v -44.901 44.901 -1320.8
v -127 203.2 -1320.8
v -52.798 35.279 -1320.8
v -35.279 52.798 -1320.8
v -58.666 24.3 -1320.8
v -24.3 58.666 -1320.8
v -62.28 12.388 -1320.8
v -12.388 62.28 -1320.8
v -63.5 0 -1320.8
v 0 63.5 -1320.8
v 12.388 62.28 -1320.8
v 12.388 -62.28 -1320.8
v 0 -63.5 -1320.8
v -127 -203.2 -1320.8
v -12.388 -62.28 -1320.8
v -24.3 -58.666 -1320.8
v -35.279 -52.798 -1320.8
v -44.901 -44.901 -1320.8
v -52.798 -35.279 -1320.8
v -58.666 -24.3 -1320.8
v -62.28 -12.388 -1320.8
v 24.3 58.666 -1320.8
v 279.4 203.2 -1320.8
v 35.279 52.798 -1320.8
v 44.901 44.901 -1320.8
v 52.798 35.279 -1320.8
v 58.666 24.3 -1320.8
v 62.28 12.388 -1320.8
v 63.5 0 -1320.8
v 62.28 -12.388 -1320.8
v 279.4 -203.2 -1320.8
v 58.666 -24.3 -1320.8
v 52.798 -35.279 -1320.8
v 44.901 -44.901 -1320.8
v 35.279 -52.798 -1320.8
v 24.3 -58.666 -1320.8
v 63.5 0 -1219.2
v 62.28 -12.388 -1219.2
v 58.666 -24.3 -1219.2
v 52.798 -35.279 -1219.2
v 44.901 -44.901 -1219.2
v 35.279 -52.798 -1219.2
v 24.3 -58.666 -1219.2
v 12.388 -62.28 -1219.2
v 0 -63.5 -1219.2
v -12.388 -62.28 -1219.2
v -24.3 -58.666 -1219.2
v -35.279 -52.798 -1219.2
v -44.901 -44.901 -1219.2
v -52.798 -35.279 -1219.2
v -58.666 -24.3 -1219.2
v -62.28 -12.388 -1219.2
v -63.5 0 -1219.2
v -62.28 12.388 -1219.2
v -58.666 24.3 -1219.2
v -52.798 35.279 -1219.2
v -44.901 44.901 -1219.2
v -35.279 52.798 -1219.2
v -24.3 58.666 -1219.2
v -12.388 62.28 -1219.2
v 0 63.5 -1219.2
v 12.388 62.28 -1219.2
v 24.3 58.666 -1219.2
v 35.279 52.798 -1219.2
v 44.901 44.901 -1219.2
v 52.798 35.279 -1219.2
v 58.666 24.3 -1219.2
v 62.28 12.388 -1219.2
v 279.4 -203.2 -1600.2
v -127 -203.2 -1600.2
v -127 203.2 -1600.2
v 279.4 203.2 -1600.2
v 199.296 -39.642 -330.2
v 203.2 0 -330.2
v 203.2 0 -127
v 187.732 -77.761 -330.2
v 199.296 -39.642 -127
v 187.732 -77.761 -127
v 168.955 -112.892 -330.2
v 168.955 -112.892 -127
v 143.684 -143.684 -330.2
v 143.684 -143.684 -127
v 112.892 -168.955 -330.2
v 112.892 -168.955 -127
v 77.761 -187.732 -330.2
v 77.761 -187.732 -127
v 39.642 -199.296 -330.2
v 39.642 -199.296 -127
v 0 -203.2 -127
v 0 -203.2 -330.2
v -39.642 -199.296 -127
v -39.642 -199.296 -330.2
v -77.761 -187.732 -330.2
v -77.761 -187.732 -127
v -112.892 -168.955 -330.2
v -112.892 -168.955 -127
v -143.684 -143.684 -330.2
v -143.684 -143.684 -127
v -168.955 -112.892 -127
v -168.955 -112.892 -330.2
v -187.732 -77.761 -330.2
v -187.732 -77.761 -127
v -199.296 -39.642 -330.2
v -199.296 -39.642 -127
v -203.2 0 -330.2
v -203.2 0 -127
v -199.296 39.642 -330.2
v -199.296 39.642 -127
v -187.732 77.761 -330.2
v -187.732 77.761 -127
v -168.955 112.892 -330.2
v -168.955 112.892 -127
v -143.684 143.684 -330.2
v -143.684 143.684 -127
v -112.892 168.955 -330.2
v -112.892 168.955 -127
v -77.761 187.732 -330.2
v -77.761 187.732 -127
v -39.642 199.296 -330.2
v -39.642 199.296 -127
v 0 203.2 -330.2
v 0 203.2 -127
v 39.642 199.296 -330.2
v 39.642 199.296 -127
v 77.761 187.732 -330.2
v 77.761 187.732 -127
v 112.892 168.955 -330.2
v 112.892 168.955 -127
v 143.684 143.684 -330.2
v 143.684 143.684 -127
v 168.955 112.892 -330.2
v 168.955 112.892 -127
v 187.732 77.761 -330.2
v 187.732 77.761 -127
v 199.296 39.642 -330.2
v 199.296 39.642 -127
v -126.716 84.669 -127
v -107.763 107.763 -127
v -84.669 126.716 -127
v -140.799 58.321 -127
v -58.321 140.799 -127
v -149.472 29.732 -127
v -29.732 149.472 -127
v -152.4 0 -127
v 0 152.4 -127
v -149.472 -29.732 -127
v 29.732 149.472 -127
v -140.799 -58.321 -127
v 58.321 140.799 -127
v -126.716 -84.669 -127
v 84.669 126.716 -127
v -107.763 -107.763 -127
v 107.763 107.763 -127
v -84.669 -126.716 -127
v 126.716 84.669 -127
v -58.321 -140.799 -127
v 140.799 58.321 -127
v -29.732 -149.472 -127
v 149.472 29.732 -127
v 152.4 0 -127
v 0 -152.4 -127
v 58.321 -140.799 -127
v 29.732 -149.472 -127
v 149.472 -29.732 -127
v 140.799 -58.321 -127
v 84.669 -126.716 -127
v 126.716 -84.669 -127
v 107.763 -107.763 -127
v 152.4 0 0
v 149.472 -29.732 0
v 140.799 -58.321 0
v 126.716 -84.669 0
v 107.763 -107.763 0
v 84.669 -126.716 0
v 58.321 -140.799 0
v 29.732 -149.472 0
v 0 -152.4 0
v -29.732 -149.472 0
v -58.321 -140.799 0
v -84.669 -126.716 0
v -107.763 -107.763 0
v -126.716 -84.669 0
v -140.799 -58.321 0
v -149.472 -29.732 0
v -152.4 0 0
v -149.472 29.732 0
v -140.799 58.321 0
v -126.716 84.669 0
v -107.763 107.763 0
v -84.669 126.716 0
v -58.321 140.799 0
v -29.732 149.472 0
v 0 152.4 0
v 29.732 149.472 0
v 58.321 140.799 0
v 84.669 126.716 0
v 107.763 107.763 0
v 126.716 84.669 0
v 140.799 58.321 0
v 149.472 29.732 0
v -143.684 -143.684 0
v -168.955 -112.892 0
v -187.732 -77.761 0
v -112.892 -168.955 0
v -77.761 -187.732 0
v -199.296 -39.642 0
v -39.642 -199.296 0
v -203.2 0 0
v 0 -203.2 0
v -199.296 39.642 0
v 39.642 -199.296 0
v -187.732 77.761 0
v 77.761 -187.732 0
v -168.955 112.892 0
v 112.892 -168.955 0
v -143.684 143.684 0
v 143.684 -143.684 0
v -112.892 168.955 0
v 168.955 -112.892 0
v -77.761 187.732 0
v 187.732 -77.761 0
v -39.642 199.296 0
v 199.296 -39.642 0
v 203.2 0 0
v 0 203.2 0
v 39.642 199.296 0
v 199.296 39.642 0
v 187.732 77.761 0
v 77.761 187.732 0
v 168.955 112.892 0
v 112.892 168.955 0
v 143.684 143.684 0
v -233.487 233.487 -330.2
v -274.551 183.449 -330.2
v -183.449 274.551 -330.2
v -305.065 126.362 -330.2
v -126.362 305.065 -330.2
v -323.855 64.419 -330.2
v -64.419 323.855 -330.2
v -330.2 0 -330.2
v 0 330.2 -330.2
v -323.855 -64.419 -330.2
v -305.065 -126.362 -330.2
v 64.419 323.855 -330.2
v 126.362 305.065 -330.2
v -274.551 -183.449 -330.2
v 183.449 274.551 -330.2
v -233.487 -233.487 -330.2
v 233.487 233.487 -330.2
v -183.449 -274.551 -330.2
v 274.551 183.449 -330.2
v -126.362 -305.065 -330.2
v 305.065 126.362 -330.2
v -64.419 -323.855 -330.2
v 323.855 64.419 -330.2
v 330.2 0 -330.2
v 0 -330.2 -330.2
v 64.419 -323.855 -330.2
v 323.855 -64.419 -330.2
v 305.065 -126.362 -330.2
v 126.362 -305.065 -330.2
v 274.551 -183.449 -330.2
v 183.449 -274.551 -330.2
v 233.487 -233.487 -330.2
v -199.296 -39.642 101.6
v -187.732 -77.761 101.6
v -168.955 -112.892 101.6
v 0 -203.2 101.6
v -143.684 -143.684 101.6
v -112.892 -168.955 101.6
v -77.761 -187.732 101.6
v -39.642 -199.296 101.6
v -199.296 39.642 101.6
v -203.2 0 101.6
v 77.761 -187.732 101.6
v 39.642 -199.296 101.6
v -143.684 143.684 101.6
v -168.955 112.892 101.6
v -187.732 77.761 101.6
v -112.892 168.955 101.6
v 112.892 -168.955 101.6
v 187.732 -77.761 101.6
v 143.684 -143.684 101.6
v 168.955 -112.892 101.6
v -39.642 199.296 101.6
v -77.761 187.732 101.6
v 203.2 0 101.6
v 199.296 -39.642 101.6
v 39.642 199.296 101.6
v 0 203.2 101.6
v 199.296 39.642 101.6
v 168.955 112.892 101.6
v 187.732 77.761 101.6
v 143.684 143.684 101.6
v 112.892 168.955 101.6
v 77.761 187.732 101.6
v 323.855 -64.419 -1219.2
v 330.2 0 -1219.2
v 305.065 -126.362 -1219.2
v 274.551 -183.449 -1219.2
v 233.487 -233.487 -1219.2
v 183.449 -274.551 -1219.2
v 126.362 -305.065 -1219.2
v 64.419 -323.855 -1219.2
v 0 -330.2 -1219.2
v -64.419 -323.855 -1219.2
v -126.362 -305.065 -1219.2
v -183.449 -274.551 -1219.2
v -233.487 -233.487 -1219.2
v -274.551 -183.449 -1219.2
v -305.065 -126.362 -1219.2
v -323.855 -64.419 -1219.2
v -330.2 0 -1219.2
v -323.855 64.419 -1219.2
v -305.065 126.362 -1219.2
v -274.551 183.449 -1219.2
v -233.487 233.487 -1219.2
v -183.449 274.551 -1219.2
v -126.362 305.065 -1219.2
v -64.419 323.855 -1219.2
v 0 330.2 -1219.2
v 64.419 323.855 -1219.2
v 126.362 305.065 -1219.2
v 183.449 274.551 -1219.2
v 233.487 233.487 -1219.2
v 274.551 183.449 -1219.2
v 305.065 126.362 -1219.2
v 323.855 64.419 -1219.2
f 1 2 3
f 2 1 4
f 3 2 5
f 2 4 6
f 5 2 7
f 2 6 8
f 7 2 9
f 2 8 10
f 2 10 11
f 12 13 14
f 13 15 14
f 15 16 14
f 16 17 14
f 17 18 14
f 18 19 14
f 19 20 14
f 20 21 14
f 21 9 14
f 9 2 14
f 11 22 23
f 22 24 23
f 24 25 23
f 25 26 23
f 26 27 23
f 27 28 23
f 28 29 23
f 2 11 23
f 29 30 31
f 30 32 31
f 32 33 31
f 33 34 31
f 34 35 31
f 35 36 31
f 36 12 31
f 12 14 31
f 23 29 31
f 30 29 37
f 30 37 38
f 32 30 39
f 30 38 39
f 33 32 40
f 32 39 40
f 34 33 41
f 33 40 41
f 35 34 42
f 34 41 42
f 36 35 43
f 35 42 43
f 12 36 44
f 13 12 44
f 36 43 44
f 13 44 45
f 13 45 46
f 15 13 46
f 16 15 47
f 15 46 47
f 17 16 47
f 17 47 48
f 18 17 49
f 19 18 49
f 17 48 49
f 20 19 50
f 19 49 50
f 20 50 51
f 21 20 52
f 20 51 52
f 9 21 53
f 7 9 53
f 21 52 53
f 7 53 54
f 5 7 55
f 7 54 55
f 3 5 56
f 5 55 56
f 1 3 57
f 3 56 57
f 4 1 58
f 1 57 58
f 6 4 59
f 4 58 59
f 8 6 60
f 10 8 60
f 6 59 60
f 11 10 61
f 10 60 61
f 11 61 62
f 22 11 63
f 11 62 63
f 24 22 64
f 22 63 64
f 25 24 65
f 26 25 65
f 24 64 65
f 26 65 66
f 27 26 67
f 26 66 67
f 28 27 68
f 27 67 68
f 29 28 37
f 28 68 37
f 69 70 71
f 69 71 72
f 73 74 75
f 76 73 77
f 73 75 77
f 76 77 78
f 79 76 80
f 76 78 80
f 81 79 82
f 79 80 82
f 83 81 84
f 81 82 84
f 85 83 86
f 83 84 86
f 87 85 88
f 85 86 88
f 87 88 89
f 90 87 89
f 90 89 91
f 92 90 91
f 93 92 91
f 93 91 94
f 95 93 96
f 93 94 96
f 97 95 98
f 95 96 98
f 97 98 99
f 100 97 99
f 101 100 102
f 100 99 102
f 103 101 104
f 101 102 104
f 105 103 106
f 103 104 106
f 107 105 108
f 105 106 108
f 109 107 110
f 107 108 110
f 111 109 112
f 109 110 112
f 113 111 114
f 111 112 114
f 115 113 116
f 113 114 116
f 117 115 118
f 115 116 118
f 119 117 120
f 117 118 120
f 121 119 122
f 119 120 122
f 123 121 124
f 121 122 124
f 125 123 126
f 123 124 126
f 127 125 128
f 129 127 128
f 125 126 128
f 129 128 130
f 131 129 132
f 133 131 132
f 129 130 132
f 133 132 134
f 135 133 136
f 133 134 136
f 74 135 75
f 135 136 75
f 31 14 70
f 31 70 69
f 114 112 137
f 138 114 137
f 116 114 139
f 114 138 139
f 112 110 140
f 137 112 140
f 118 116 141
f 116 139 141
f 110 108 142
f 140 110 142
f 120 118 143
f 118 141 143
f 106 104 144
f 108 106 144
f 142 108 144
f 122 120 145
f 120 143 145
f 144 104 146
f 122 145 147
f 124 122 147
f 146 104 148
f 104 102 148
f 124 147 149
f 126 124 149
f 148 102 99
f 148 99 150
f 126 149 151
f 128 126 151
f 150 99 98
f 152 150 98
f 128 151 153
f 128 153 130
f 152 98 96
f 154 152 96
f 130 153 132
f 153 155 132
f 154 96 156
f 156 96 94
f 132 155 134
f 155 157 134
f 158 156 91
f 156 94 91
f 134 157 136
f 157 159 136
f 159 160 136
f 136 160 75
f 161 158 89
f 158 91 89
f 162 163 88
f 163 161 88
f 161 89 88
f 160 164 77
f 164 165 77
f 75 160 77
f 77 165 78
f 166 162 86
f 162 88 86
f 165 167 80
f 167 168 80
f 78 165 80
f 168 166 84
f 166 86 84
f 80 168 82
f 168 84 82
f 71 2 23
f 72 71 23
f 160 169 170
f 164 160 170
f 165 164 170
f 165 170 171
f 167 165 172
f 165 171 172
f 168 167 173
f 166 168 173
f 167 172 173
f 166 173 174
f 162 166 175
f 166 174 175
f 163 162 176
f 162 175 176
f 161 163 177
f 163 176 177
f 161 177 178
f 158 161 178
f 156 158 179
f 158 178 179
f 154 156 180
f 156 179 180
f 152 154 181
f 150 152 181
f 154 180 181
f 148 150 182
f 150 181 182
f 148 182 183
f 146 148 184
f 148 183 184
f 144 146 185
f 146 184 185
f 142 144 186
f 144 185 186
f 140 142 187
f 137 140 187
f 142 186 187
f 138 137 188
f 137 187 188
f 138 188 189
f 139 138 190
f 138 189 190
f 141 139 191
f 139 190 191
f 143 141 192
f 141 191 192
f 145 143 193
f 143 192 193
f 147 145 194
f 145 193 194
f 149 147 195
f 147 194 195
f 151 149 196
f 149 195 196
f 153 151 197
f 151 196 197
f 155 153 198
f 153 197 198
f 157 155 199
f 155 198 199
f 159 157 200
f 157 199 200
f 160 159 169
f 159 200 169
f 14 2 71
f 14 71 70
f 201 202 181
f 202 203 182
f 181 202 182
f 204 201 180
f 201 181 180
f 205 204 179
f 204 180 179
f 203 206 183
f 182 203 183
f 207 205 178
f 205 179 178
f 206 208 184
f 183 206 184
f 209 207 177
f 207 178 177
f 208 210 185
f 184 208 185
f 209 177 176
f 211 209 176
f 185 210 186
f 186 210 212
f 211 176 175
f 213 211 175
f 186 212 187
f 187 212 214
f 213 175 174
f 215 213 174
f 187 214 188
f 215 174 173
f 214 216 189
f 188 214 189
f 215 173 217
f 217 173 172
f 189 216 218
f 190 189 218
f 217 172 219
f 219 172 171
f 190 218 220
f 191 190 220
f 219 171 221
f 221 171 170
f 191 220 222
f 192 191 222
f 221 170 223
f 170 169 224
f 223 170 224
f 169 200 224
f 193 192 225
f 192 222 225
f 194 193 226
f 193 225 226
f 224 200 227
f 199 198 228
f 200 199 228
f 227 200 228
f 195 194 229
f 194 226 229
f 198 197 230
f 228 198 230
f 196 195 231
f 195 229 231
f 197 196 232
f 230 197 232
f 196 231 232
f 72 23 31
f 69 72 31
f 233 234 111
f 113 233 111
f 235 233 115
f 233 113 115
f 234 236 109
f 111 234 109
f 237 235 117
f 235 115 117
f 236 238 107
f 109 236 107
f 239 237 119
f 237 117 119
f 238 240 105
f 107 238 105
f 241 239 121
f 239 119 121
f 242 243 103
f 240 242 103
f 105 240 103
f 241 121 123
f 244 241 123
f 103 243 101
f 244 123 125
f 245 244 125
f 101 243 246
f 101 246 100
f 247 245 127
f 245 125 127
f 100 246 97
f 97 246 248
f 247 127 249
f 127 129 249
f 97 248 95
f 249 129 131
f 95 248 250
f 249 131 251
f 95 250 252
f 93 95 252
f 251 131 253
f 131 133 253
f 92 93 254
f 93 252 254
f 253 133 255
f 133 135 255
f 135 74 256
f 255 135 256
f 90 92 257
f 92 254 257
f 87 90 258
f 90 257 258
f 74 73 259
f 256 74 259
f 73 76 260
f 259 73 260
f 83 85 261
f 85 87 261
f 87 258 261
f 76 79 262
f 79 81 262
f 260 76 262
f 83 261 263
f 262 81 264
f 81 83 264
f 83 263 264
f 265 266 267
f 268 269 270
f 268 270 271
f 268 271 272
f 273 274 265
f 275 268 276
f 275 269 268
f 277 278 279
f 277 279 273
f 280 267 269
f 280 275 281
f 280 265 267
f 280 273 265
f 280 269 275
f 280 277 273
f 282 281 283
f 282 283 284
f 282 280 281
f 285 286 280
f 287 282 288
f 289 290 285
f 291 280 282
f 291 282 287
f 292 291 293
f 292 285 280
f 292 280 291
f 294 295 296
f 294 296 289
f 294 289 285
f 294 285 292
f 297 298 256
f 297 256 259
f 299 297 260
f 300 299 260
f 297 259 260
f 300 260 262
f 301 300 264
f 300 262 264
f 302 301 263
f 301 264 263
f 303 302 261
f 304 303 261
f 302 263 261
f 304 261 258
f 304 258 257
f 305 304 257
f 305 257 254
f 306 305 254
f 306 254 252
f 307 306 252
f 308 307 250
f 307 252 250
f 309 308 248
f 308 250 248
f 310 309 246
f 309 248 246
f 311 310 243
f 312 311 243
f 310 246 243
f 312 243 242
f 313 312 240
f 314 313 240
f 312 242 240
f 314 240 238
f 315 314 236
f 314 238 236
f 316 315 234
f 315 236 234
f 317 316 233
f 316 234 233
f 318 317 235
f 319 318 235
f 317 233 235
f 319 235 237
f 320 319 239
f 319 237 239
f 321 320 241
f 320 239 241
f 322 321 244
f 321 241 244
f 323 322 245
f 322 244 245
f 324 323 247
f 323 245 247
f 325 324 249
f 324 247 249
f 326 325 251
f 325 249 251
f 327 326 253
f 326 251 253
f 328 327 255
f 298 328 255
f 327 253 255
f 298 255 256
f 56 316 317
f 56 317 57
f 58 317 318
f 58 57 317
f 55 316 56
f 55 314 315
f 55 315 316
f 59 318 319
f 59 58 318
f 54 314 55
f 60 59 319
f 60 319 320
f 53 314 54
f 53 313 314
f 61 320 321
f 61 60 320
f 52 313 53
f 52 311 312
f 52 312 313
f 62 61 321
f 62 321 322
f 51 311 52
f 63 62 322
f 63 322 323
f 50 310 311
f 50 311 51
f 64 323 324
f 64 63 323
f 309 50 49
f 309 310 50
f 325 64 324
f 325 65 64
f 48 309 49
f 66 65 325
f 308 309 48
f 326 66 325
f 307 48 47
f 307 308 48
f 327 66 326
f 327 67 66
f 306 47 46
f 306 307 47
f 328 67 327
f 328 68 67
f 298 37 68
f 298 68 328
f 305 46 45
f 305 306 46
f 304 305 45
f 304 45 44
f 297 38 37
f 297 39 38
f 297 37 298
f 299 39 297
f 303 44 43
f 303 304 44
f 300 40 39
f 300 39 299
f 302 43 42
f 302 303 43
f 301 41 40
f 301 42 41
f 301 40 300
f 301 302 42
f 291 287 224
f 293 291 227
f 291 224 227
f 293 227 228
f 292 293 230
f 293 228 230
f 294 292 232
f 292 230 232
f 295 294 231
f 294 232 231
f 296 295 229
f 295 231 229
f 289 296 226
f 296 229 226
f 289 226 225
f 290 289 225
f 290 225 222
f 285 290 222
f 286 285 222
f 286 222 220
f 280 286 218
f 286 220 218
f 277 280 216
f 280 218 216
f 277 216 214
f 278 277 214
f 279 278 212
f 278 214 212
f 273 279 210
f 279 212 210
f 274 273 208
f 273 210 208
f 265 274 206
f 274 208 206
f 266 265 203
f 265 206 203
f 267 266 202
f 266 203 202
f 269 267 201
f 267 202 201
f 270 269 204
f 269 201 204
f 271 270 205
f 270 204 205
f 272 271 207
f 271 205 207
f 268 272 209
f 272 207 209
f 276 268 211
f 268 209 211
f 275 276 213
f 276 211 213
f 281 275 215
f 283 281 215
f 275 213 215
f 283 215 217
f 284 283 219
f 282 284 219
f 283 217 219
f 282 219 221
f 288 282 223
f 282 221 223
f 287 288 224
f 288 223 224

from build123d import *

# Parameters (mm, degrees)
F0_R      = 203.2
F1_DEPTH  = 101.6
F2_R      = 152.4
F3_DEPTH  = 127
F4_R      = 203.2
F5_DEPTH  = 203.2
F6_R      = 330.2
F7_DEPTH  = 889
F8_R      = 63.5
F9_DEPTH  = 101.6
F10_W     = 406.4
F10_H     = 406.4
F10_R     = 63.5
F11_DEPTH = 279.4


with BuildPart() as f1:
    # F0 (on Top) → F1 (new body)
    with BuildSketch(Plane.XY):
        Circle(F0_R)
    extrude(amount=F1_DEPTH)

    # F2 (on face) → F3 (join)
    with BuildSketch(Plane(origin=(0, 0, 0), x_dir=(1, 0, 0), z_dir=(0, 0, -1))):
        Circle(F2_R)
    extrude(amount=F3_DEPTH)

    # F4 (on face) → F5 (join)
    with BuildSketch(Plane(origin=(0, 0, -127), x_dir=(1, 0, 0), z_dir=(0, 0, -1))):
        Circle(F4_R)
    extrude(amount=F5_DEPTH)

    # F6 (on face) → F7 (join)
    with BuildSketch(Plane(origin=(0, 0, -330.2), x_dir=(1, 0, 0), z_dir=(0, 0, -1))):
        Circle(F6_R)
    extrude(amount=F7_DEPTH)

    # F8 (on face) → F9 (join)
    with BuildSketch(Plane(origin=(0, 0, -1219.2), x_dir=(1, 0, 0), z_dir=(0, 0, -1))):
        Circle(F8_R)
    extrude(amount=F9_DEPTH)

    # F10 (on face) → F11 (join)
    with BuildSketch(Plane(origin=(0, 0, -1320.8), x_dir=(1, 0, 0), z_dir=(0, 0, -1))):
        with Locations((76.2, 0)):
            Rectangle(F10_W, F10_H)
        Circle(F10_R, mode=Mode.SUBTRACT)
        Circle(F10_R)
    extrude(amount=F11_DEPTH)


solid = f1.part
